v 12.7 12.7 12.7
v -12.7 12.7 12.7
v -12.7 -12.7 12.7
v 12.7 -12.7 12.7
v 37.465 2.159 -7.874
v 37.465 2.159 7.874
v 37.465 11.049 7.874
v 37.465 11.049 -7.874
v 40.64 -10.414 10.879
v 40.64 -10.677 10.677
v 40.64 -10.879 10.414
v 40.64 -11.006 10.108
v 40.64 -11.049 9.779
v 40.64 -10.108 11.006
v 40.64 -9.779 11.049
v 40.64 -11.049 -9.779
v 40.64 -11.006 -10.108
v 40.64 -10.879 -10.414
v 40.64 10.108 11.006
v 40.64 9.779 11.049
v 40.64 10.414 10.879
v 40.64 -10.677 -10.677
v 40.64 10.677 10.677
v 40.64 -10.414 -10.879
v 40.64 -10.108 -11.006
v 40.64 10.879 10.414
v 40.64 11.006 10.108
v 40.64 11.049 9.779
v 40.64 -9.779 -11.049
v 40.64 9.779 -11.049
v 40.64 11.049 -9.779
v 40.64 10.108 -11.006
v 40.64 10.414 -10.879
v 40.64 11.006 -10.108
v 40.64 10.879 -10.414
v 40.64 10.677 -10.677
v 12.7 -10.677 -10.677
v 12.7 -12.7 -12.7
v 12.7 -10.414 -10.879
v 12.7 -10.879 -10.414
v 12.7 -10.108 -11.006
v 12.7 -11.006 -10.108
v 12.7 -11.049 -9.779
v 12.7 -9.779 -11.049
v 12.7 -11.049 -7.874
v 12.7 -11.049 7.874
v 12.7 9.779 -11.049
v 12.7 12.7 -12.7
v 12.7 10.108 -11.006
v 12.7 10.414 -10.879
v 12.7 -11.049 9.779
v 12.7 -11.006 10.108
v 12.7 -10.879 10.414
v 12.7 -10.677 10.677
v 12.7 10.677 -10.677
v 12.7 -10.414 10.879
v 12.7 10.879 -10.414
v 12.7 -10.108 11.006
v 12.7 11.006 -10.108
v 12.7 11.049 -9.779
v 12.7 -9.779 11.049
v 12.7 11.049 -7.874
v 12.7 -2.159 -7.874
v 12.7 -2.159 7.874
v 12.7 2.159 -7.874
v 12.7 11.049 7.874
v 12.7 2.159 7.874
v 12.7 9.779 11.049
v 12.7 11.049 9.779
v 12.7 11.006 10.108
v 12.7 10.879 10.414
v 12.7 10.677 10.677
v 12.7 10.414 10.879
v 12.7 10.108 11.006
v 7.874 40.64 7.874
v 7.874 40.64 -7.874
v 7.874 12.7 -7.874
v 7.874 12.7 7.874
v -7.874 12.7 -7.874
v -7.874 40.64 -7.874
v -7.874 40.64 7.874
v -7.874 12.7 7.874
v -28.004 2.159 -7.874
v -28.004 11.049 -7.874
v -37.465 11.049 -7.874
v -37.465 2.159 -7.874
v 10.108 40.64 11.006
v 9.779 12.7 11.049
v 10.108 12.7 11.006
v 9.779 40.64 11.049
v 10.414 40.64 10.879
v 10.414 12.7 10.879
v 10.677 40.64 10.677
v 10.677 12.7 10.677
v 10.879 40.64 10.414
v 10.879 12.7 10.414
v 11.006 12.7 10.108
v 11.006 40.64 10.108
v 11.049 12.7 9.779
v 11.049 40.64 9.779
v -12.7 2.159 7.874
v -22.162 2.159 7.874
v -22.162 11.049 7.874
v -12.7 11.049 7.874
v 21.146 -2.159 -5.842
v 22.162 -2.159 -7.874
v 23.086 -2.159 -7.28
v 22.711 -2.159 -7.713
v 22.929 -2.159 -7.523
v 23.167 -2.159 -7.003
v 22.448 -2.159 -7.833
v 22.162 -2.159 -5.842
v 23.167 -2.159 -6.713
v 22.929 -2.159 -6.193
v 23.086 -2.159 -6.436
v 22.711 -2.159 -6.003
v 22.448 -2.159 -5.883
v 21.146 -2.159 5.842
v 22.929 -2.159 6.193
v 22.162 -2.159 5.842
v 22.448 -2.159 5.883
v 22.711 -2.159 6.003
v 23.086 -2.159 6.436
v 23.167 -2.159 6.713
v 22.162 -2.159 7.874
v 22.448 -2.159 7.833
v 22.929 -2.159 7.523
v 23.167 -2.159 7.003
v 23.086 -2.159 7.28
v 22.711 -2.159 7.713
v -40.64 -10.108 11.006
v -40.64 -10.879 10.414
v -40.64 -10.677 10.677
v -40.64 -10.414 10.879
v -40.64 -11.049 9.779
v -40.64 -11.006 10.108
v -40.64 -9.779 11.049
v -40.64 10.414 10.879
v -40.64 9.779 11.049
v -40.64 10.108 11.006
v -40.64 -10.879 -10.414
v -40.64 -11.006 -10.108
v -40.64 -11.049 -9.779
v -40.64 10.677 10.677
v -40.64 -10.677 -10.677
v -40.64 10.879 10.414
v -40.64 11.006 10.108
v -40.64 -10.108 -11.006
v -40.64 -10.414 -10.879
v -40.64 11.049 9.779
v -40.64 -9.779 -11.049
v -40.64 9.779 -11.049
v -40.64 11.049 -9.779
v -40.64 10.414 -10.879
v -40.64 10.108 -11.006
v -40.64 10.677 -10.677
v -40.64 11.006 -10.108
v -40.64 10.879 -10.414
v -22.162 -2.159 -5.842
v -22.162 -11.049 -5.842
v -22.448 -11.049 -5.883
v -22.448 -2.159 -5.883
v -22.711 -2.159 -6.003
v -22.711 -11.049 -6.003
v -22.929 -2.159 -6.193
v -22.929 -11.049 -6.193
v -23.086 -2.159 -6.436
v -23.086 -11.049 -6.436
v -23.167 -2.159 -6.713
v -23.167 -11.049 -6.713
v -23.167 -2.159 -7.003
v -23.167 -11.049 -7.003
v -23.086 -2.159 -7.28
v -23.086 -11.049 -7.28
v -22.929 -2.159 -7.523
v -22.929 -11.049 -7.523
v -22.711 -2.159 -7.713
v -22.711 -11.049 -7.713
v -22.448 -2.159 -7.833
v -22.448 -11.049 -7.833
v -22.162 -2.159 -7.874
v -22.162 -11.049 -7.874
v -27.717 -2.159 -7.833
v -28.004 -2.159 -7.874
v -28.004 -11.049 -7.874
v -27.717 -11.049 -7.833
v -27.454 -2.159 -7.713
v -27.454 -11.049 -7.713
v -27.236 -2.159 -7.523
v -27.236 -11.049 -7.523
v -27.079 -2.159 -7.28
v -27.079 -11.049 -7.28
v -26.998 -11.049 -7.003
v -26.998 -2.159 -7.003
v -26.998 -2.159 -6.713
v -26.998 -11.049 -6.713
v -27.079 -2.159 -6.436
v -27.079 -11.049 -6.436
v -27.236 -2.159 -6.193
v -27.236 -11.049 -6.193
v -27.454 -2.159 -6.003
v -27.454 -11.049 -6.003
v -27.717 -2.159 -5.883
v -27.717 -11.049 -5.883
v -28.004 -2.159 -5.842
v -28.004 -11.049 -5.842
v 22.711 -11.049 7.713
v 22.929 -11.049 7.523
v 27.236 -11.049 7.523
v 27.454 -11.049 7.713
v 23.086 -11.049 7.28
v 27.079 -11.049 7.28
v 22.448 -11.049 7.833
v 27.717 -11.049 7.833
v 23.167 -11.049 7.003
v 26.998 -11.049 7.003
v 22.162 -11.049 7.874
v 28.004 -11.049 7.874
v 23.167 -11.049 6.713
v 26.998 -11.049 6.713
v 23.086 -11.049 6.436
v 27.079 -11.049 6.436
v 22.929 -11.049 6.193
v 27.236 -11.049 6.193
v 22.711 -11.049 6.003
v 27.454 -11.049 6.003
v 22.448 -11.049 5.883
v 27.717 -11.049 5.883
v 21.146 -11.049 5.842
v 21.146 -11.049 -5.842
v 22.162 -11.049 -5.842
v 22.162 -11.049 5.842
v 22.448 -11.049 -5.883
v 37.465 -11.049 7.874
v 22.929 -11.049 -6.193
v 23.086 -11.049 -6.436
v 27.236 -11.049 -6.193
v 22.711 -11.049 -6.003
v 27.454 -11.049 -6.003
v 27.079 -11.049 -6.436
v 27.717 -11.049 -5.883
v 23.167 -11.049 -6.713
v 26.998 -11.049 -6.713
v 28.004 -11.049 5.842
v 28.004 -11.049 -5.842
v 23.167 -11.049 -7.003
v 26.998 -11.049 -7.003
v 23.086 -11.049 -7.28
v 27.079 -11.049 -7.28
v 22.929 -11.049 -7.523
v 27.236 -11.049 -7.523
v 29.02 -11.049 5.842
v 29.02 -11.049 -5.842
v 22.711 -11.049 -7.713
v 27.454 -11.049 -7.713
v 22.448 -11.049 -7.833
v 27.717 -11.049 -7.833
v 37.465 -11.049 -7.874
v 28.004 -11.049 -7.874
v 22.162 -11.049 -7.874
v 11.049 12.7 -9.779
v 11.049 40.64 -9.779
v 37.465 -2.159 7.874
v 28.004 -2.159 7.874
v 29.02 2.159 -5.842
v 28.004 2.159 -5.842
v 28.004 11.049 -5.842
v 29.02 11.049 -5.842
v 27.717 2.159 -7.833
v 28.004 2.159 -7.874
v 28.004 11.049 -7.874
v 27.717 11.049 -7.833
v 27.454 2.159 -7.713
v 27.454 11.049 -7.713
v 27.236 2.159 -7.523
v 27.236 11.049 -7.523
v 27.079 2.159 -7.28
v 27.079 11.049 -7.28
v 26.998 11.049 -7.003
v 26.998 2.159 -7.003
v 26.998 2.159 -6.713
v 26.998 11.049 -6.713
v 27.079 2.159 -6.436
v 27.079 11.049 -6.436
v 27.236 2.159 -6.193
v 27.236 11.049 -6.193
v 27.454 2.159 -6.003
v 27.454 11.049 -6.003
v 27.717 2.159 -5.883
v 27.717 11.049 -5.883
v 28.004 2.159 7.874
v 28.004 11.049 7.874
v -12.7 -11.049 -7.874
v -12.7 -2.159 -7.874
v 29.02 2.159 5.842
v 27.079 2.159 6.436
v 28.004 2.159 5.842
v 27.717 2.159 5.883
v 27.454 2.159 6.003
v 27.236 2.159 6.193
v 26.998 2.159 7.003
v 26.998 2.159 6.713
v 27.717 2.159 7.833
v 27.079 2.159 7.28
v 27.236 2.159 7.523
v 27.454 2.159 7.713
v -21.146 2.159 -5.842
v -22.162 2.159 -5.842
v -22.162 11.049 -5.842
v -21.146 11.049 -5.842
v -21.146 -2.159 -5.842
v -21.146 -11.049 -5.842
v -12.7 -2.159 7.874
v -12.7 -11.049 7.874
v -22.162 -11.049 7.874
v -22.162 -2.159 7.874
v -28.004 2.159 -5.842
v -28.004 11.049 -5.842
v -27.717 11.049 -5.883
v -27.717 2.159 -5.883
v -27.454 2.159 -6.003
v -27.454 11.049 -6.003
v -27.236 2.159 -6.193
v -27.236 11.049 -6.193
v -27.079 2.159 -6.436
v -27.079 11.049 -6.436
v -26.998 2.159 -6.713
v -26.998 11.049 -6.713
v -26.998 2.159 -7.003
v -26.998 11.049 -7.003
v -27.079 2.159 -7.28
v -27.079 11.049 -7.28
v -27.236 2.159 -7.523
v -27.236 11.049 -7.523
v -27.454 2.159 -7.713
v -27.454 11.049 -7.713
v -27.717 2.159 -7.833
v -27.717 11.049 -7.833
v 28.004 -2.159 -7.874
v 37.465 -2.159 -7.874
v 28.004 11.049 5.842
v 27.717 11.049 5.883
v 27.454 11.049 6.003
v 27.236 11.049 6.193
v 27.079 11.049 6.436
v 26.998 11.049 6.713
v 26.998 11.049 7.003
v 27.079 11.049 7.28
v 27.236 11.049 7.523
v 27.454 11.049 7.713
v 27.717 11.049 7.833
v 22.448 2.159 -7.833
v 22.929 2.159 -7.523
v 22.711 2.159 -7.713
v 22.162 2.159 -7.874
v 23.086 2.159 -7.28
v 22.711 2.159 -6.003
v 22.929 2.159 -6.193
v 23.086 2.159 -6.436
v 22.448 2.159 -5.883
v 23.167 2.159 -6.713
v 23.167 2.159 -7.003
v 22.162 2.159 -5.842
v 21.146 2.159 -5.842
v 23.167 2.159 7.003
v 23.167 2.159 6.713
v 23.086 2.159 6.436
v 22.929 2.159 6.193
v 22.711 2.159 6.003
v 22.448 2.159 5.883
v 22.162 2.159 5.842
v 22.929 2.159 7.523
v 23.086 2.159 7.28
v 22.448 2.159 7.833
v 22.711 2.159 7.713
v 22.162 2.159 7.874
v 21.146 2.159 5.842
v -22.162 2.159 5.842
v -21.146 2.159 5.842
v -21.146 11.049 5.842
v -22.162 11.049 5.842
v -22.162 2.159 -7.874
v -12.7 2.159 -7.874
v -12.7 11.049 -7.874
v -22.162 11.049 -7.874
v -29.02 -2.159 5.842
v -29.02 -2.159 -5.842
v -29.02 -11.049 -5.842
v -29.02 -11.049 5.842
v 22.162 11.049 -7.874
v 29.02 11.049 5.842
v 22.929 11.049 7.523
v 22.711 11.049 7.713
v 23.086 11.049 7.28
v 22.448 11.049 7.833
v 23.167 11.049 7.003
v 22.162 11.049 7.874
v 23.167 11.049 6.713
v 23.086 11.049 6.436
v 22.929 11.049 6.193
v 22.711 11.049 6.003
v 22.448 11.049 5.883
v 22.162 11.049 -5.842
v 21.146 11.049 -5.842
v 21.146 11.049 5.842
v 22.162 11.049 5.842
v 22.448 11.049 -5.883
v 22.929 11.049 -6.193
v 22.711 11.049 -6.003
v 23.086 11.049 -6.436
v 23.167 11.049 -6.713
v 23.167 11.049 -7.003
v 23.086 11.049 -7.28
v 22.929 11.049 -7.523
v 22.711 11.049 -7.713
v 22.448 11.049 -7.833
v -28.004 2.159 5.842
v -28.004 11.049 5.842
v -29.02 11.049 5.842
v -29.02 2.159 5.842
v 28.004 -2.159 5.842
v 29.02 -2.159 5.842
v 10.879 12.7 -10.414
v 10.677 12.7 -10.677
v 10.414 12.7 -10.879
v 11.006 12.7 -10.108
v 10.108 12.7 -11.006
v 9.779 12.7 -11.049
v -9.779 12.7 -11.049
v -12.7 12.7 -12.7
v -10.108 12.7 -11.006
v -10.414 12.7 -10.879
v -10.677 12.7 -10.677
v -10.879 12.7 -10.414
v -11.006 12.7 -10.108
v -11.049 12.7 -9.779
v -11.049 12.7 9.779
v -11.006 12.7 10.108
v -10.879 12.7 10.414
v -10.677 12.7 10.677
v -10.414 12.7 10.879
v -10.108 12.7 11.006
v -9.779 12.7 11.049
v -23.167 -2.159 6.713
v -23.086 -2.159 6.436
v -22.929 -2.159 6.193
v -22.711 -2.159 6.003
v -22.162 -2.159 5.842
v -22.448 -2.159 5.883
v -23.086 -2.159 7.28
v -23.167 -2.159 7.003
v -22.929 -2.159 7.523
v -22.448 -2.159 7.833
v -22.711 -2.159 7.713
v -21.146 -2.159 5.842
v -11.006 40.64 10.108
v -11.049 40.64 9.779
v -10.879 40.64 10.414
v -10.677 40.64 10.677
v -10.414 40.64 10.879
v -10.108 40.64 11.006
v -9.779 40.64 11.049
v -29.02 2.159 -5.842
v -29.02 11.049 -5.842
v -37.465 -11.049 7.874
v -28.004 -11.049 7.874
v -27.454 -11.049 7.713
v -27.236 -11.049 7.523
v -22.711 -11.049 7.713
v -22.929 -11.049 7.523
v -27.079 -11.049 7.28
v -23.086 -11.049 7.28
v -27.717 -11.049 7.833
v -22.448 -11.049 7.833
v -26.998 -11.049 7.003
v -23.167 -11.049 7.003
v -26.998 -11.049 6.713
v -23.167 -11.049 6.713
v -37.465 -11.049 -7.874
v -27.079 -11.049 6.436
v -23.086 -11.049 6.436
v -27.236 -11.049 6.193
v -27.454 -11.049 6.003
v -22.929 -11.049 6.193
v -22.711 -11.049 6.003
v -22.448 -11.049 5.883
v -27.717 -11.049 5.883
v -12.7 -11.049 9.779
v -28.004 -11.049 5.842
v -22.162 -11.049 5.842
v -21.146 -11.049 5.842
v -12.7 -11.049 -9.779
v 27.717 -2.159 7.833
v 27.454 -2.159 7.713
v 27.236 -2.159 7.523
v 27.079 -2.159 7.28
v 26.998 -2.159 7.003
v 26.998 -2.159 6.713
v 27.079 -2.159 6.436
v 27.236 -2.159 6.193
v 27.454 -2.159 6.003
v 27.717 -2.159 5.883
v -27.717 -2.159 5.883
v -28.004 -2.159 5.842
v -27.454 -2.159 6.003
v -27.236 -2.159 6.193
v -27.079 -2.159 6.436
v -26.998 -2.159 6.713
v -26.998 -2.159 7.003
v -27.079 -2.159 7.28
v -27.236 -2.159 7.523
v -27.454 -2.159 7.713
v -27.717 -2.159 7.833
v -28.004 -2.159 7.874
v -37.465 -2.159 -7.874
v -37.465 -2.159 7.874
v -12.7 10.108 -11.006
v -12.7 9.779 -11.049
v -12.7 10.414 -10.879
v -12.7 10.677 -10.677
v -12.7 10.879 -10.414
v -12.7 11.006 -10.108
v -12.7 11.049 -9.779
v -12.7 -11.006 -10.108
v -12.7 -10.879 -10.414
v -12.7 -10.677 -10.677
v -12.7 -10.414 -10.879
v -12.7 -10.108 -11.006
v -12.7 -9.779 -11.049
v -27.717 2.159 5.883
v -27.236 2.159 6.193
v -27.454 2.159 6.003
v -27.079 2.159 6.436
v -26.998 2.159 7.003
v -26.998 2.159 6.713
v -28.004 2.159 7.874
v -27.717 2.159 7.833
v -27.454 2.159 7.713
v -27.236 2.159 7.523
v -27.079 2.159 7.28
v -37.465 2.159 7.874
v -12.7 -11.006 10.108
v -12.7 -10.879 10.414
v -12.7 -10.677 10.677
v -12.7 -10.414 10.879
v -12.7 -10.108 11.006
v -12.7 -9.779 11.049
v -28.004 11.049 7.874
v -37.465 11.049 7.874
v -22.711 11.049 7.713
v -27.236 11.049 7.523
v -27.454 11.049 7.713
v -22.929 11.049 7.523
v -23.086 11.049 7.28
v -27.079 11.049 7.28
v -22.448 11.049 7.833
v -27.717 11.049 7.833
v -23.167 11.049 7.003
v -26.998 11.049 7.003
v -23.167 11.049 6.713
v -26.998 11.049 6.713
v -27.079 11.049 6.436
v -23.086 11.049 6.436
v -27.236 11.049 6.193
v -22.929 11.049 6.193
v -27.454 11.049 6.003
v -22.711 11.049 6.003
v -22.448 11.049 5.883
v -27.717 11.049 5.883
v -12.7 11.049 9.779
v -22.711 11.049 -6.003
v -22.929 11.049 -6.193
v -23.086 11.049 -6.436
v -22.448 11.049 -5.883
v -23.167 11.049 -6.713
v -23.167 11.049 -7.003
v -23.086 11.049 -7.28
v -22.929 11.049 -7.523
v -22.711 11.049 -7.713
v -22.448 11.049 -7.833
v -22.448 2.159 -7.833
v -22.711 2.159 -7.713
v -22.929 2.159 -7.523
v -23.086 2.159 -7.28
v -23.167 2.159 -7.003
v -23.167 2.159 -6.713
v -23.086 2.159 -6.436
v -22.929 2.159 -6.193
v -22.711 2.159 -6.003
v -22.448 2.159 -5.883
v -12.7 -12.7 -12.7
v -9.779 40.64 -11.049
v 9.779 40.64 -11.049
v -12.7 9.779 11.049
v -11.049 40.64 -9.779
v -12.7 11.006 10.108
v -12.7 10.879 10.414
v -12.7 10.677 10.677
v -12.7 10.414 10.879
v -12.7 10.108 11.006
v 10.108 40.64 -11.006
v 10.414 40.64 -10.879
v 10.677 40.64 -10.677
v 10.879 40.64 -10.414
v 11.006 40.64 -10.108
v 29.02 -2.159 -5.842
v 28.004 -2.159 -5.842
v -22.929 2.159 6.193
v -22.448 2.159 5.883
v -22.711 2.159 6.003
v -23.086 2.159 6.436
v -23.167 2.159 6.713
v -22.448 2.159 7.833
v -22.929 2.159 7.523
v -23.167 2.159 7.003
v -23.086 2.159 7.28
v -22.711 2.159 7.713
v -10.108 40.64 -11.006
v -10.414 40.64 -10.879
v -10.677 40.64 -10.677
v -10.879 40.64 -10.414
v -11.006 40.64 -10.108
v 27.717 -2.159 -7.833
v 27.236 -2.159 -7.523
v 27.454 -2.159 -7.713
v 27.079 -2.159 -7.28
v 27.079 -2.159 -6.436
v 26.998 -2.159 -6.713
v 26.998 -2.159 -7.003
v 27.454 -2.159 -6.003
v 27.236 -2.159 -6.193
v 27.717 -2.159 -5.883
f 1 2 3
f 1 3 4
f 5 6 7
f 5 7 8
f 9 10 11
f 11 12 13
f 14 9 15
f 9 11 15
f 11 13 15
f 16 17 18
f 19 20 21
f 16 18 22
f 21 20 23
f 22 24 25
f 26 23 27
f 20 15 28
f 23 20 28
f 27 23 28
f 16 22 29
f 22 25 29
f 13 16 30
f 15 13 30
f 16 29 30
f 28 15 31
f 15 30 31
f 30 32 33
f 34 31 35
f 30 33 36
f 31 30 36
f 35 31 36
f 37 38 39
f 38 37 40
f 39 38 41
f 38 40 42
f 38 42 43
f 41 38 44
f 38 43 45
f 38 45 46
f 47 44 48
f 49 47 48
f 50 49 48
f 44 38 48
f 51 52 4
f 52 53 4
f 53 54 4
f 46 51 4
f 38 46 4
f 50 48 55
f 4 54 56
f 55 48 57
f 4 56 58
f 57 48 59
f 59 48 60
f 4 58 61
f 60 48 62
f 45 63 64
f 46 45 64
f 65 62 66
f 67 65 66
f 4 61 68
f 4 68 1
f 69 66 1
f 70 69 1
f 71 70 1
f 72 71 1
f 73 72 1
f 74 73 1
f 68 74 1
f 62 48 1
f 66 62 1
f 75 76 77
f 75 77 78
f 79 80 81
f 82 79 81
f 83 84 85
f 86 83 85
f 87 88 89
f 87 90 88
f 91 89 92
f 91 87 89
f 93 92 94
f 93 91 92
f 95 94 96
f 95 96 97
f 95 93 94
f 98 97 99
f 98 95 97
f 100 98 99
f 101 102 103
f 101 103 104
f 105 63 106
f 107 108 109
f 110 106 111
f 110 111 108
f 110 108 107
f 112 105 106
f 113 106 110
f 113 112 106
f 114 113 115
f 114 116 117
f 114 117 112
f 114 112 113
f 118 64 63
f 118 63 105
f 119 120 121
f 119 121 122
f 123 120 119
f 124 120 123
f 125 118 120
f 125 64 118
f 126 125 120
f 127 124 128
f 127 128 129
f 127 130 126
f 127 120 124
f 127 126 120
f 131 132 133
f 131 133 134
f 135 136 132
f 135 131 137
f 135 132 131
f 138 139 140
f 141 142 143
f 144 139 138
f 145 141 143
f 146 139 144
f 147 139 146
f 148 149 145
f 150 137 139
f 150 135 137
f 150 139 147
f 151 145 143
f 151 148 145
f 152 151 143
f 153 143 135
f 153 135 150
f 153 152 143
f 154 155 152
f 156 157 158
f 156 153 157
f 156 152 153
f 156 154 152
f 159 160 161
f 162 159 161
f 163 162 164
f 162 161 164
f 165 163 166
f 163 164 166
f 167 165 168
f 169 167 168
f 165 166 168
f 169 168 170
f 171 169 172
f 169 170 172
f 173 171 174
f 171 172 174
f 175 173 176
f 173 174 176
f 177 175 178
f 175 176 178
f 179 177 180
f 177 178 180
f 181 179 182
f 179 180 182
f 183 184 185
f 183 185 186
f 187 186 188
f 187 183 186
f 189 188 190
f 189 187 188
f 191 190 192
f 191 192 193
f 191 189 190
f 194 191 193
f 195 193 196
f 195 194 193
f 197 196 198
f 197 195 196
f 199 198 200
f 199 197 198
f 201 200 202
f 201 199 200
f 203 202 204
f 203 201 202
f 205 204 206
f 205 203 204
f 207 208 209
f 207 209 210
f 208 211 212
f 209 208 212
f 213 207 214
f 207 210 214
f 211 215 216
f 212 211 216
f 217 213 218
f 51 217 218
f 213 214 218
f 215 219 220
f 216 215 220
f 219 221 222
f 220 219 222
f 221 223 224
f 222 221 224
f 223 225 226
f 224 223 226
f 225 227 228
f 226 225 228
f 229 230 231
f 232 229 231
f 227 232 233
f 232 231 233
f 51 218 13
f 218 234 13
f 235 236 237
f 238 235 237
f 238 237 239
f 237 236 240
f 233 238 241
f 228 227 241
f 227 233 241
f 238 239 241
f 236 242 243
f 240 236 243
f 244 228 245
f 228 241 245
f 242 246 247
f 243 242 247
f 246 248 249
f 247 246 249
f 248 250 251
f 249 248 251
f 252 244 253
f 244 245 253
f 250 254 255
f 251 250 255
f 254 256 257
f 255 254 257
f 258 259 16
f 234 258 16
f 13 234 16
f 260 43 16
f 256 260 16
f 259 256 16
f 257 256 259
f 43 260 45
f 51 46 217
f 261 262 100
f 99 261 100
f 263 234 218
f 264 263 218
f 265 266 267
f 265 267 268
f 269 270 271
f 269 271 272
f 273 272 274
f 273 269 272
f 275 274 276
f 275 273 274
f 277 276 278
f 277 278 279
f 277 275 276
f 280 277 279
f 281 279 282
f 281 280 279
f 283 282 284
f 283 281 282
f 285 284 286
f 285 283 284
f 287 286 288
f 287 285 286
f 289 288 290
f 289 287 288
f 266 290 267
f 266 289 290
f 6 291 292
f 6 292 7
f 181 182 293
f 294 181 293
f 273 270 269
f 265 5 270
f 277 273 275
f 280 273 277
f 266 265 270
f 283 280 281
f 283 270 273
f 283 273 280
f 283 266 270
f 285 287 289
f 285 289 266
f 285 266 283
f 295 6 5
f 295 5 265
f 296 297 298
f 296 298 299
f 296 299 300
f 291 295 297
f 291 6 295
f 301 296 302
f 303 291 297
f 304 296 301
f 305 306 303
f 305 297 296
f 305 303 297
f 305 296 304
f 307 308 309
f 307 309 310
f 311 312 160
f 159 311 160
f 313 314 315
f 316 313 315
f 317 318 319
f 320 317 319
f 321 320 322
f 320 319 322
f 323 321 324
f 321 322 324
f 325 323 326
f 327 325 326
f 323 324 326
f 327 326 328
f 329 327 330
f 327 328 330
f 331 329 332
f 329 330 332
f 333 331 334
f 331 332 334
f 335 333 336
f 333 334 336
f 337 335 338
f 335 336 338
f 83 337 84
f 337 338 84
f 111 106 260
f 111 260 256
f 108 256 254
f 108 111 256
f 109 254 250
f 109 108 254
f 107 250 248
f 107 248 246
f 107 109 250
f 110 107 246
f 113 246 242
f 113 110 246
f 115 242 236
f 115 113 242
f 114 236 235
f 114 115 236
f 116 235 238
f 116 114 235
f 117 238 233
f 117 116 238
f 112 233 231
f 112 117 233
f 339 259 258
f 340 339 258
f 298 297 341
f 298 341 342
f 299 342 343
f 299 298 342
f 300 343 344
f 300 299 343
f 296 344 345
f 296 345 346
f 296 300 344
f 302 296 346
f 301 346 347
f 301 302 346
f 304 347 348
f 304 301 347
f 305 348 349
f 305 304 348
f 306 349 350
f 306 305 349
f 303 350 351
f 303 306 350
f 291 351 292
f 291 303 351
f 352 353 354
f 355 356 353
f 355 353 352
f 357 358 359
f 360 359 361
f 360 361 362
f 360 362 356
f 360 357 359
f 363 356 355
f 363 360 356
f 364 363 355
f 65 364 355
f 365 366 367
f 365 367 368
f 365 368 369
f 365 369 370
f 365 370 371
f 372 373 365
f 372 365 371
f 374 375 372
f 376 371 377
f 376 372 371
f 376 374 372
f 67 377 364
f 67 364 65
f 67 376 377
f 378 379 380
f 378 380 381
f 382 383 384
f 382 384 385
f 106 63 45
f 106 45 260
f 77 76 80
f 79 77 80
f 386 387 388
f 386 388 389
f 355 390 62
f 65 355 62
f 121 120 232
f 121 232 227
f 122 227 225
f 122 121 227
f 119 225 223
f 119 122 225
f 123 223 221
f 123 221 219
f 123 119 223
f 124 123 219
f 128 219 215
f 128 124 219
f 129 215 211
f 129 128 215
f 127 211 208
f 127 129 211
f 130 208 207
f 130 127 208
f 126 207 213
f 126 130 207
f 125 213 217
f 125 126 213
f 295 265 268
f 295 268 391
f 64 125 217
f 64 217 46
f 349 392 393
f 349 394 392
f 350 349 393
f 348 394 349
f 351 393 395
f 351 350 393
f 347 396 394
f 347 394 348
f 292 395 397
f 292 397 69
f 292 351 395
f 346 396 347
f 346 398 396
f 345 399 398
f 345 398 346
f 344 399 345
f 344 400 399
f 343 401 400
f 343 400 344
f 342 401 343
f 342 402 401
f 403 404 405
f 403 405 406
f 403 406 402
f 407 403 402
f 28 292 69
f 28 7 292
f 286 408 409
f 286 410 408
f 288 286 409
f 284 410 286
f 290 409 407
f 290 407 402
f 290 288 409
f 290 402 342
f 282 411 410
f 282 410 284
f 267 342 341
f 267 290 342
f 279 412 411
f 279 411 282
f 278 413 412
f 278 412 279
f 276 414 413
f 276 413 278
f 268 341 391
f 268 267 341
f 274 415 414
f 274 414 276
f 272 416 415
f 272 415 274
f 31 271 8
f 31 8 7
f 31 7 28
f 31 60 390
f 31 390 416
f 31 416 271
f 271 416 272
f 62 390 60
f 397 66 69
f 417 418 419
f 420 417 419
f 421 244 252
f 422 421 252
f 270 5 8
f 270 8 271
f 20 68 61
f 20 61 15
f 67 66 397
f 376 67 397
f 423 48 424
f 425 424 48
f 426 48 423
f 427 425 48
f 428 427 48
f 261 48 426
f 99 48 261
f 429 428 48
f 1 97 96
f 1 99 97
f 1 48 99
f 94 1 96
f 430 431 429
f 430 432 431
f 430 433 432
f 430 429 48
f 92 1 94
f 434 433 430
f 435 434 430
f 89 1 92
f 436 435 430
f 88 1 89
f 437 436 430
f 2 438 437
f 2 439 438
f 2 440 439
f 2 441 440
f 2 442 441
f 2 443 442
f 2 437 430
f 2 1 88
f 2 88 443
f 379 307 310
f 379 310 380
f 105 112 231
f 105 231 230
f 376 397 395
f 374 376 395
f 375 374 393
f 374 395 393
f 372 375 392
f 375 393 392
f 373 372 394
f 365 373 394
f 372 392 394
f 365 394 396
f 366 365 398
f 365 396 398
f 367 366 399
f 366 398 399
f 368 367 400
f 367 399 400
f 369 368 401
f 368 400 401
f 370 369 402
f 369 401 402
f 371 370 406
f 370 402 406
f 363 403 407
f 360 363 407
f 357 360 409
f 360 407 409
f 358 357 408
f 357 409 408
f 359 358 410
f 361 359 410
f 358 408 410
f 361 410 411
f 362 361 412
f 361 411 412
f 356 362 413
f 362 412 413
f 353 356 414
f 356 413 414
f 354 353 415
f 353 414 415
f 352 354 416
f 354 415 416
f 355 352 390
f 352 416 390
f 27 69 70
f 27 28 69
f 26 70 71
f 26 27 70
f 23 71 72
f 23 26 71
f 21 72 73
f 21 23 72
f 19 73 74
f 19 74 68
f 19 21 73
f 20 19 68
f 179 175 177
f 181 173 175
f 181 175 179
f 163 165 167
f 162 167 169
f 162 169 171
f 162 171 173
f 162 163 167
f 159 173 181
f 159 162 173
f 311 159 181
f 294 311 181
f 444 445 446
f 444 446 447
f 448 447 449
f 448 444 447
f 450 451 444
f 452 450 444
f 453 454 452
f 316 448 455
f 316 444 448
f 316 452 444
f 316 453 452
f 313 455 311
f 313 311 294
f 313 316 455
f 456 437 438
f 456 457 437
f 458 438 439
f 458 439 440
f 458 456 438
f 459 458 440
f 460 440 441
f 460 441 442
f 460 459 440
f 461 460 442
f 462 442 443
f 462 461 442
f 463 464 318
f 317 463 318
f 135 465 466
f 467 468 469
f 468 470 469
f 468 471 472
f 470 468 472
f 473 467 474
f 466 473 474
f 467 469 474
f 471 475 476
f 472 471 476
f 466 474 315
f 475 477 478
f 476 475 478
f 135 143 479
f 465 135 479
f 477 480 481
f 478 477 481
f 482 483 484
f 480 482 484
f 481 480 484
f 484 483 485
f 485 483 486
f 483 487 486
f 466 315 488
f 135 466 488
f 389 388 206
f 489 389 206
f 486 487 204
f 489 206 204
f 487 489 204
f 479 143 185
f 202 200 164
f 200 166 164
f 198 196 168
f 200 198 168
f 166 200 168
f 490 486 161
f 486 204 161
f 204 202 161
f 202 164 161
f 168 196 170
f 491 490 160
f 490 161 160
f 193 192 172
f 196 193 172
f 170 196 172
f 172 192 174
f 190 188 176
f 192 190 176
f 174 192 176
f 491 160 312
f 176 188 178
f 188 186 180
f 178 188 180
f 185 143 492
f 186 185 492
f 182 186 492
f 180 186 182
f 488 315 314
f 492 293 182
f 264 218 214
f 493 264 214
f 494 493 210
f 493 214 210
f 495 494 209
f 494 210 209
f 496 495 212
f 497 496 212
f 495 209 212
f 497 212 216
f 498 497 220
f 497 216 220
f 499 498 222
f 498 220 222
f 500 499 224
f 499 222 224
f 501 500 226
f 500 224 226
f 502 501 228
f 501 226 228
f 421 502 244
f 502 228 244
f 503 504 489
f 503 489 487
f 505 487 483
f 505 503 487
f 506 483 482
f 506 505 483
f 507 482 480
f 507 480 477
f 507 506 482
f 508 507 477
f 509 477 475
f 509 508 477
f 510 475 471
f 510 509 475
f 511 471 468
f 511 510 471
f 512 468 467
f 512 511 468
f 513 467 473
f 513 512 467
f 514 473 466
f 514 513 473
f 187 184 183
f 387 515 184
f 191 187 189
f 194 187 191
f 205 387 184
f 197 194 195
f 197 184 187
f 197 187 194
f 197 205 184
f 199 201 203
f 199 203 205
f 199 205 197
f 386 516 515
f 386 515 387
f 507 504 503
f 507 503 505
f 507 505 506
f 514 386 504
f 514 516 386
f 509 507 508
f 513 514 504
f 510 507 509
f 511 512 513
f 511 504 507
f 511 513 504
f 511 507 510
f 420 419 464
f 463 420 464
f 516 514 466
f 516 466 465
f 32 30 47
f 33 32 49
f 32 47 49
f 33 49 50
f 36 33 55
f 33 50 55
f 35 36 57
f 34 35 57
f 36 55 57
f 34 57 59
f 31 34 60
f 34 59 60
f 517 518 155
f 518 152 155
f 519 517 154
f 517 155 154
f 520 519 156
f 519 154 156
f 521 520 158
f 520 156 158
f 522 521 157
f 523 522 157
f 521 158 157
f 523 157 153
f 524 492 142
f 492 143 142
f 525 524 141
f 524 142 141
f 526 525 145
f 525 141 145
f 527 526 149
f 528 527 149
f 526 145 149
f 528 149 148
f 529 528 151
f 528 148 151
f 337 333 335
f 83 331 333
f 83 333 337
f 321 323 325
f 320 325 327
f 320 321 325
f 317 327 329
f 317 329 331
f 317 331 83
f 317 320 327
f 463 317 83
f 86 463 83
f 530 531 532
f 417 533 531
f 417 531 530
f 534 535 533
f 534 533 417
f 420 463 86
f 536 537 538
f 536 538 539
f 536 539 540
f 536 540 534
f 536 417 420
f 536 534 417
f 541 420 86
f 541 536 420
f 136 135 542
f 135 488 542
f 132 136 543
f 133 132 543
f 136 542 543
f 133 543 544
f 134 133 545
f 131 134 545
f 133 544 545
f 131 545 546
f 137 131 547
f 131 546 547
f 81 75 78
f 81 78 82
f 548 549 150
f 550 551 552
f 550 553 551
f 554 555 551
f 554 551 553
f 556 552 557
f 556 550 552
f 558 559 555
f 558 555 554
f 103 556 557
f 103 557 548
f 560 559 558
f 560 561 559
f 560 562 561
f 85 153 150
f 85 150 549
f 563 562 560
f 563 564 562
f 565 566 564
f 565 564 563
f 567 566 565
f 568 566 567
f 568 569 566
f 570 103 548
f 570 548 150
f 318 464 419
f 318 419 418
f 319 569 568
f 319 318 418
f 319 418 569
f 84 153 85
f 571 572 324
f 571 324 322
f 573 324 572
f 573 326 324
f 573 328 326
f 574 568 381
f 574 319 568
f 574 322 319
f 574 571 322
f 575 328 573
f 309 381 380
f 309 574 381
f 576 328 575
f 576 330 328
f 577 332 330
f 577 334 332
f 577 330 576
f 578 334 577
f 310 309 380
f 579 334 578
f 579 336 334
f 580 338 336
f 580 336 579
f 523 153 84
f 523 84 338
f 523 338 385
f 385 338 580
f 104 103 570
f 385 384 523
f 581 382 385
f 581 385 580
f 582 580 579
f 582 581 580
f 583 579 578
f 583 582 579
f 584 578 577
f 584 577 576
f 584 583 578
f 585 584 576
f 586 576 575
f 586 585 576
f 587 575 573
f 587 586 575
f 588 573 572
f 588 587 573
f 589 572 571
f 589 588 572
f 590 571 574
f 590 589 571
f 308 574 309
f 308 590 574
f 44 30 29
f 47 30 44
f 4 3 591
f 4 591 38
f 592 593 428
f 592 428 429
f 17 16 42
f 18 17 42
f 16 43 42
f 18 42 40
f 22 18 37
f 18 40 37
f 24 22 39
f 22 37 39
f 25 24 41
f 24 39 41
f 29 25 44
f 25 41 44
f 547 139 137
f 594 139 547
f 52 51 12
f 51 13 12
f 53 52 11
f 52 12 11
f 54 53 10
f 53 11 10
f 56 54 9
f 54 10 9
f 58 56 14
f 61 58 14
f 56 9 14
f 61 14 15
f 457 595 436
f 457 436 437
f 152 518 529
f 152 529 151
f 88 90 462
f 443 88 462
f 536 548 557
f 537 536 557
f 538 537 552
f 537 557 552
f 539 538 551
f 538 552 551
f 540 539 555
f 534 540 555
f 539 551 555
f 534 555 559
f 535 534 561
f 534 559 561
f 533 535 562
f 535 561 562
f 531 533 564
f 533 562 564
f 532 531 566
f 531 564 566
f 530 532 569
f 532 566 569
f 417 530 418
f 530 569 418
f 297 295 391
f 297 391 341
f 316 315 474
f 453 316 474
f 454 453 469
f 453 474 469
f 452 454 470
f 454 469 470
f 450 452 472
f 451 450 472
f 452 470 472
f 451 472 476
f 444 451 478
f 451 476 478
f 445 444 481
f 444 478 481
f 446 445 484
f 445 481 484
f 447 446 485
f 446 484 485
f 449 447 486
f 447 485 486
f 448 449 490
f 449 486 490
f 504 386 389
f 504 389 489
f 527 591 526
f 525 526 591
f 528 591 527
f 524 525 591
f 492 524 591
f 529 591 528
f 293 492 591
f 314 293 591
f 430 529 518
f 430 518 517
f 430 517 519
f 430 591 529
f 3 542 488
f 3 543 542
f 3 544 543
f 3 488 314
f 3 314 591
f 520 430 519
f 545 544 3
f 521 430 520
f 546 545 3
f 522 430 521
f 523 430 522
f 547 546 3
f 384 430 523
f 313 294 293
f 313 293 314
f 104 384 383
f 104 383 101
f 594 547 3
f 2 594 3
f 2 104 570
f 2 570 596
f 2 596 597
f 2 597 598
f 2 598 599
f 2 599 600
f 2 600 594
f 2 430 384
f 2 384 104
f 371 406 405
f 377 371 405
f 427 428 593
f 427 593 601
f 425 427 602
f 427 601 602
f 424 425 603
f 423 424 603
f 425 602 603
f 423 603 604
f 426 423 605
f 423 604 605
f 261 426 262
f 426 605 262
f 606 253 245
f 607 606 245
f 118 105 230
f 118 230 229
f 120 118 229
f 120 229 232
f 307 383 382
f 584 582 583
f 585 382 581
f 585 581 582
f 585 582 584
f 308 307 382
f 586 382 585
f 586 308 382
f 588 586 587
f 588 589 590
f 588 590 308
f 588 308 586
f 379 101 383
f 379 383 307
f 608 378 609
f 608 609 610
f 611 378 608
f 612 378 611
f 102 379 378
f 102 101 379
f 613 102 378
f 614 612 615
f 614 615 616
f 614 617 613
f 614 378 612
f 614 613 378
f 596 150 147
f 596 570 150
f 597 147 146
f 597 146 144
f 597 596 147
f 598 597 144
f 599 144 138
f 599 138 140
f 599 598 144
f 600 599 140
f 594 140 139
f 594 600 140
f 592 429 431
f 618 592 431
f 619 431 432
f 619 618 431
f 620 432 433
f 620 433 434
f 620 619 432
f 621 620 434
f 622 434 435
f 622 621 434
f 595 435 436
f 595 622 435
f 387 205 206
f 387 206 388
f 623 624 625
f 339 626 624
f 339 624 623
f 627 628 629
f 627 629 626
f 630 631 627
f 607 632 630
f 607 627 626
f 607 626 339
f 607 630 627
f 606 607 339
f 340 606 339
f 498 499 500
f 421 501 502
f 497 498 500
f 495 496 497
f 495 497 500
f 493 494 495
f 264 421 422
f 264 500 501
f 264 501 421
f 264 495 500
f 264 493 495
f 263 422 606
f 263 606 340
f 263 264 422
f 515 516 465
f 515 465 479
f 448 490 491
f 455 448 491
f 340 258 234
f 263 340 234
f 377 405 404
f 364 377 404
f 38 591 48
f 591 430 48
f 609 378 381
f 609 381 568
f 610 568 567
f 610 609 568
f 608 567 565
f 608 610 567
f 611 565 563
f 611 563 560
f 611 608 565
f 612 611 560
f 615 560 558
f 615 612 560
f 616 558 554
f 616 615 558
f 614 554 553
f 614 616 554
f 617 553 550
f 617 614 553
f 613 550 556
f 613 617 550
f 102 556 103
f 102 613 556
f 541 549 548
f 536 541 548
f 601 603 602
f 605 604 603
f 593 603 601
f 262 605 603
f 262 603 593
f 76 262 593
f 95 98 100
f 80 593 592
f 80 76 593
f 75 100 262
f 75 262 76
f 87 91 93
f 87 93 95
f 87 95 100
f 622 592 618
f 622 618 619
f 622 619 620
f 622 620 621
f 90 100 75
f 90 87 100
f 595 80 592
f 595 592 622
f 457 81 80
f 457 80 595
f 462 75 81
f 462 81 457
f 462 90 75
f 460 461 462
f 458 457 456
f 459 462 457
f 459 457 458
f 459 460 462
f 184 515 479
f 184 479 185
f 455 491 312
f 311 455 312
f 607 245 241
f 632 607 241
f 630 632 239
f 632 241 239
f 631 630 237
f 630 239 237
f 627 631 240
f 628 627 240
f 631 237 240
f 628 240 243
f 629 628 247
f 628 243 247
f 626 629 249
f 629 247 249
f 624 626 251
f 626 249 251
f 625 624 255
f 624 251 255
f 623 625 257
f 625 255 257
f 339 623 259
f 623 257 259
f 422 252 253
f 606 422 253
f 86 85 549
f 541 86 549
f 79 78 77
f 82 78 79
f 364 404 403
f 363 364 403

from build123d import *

# Parameters (mm, degrees)
CUT_EXTRUDE1_START       = -25.4
CUT_EXTRUDE1_OUTLINE_W   = 81.28
CUT_EXTRUDE1_OUTLINE_H   = 22.098
CUT_EXTRUDE1_DEPTH       = 23.749
CUT_EXTRUDE1_START_2     = -1.651
CUT_EXTRUDE1_2_OUTLINE_W = 53.34
CUT_EXTRUDE1_2_OUTLINE_H = 22.098
CUT_EXTRUDE1_2_DEPTH     = 1.651
SKETCH2_W                = 27.94
SKETCH2_H                = 22.098
CUT_EXTRUDE2_DEPTH       = 1.651
SKETCH3_W                = 27.94
SKETCH3_H                = 22.098
CUT_EXTRUDE3_DEPTH       = 1.651
SKETCH4_W                = 27.94
SKETCH4_H                = 22.098
CUT_EXTRUDE4_DEPTH       = 1.651
SKETCH5_W                = 25.4
SKETCH5_H                = 25.4
BOSS_EXTRUDE1_DEPTH      = 1.651
SKETCH6_W                = 25.4
SKETCH6_H                = 25.4
BOSS_EXTRUDE2_DEPTH      = 1.651
CUT_EXTRUDE5_DEPTH       = 8.89
CUT_EXTRUDE6_DEPTH       = 8.89
CUT_EXTRUDE7_START       = -8.89
CUT_EXTRUDE7_DEPTH       = 8.89
CUT_EXTRUDE8_START       = -8.89
CUT_EXTRUDE8_DEPTH       = 8.89
CUT_EXTRUDE9_DEPTH       = 8.89
CUT_EXTRUDE10_START      = -8.89
CUT_EXTRUDE10_DEPTH      = 8.89
CUT_EXTRUDE11_DEPTH      = 8.89
CUT_EXTRUDE12_START      = -8.89
CUT_EXTRUDE12_DEPTH      = 8.89
SKETCH15_W               = 22.098
SKETCH15_H               = 22.098
BOSS_EXTRUDE3_DEPTH      = 27.94
SKETCH16_W               = 15.748
SKETCH16_H               = 15.748
CUT_EXTRUDE13_DEPTH      = 27.94
FILLET1_R                = 1.27


with BuildPart() as part:
    # Cut-Extrude1: read off the stored shape, not the designer's step
    # Cut-Extrude1 outline → Cut-Extrude1 (new body)
    with BuildSketch(Plane.XY.offset(12.7).offset(CUT_EXTRUDE1_START)):
        Rectangle(CUT_EXTRUDE1_OUTLINE_W, CUT_EXTRUDE1_OUTLINE_H)
    extrude(amount=CUT_EXTRUDE1_DEPTH)

    # Cut-Extrude1 2 outline → Cut-Extrude1 2 (add)
    with BuildSketch(Plane.XY.offset(12.7).offset(CUT_EXTRUDE1_START_2)):
        with Locations((13.97, 0)):
            Rectangle(CUT_EXTRUDE1_2_OUTLINE_W, CUT_EXTRUDE1_2_OUTLINE_H)
    extrude(amount=CUT_EXTRUDE1_2_DEPTH)

    # Sketch2 → Cut-Extrude2 (cut)
    with BuildSketch(Plane(origin=(0, 0, -12.7), x_dir=(-1, 0, 0), z_dir=(0, 0, -1))):
        with Locations((26.67, 0)):
            Rectangle(SKETCH2_W, SKETCH2_H)
    extrude(amount=-CUT_EXTRUDE2_DEPTH, mode=Mode.SUBTRACT)

    # Sketch3 → Cut-Extrude3 (cut)
    with BuildSketch(Plane(origin=(0, 0, -12.7), x_dir=(-1, 0, 0), z_dir=(0, 0, -1))):
        with Locations((-26.67, 0)):
            Rectangle(SKETCH3_W, SKETCH3_H)
    extrude(amount=-CUT_EXTRUDE3_DEPTH, mode=Mode.SUBTRACT)

    # Sketch4 → Cut-Extrude4 (cut)
    with BuildSketch(Plane.XY.offset(12.7)):
        with Locations((26.67, 0)):
            Rectangle(SKETCH4_W, SKETCH4_H)
    extrude(amount=-CUT_EXTRUDE4_DEPTH, mode=Mode.SUBTRACT)

    # Sketch5 → Boss-Extrude1 (add)
    with BuildSketch(Plane(origin=(0, 11.049, 0), x_dir=(-1, 0, 0), z_dir=(0, 1, 0))):
        Rectangle(SKETCH5_W, SKETCH5_H)
    extrude(amount=BOSS_EXTRUDE1_DEPTH)

    # Sketch6 → Boss-Extrude2 (add)
    with BuildSketch(Plane.XZ.offset(11.049)):
        Rectangle(SKETCH6_W, SKETCH6_H)
    extrude(amount=BOSS_EXTRUDE2_DEPTH)

    # Sketch7 → Cut-Extrude5 (cut)
    with BuildSketch(Plane(origin=(0, 11.049, 0), x_dir=(-1, 0, 0), z_dir=(0, 1, 0))):
        with BuildLine():
            Line((-12.7, -7.874), (-12.7, 7.874))
            Line((-12.7, 7.874), (-22.1615, 7.874))
            ThreePointArc((-22.1615, 7.874), (-23.1775, 6.858), (-22.1615, 5.842))
            Line((-22.1615, 5.842), (-21.1455, 5.842))
            Line((-21.1455, 5.842), (-21.1455, -5.842))
            Line((-21.1455, -5.842), (-22.1615, -5.842))
            ThreePointArc((-22.1615, -5.842), (-23.1775, -6.858), (-22.1615, -7.874))
            Line((-22.1615, -7.874), (-12.7, -7.874))
        make_face()
    extrude(amount=-CUT_EXTRUDE5_DEPTH, mode=Mode.SUBTRACT)

    # Sketch8 → Cut-Extrude6 (cut)
    with BuildSketch(Plane.XZ.offset(11.049)):
        with BuildLine():
            Line((-22.1615, 5.842), (-21.1455, 5.842))
            Line((-21.1455, 5.842), (-21.1455, -5.842))
            Line((-21.1455, -5.842), (-22.1615, -5.842))
            ThreePointArc((-22.1615, -5.842), (-23.1775, -6.858), (-22.1615, -7.874))
            Line((-22.1615, -7.874), (-12.7, -7.874))
            Line((-12.7, -7.874), (-12.7, 7.874))
            Line((-12.7, 7.874), (-22.1615, 7.874))
            ThreePointArc((-22.1615, 7.874), (-23.1775, 6.858), (-22.1615, 5.842))
        make_face()
    extrude(amount=-CUT_EXTRUDE6_DEPTH, mode=Mode.SUBTRACT)

    # Sketch9 → Cut-Extrude7 (cut)
    with BuildSketch(Plane.XZ.offset(11.049).offset(CUT_EXTRUDE7_START)):
        with BuildLine():
            Line((12.7, 7.874), (12.7, -7.874))
            Line((12.7, -7.874), (22.1615, -7.874))
            ThreePointArc((22.1615, -7.874), (23.1775, -6.858), (22.1615, -5.842))
            Line((22.1615, -5.842), (21.1455, -5.842))
            Line((21.1455, -5.842), (21.1455, 5.842))
            Line((21.1455, 5.842), (22.1615, 5.842))
            ThreePointArc((22.1615, 5.842), (23.1775, 6.858), (22.1615, 7.874))
            Line((22.1615, 7.874), (12.7, 7.874))
        make_face()
    extrude(amount=CUT_EXTRUDE7_DEPTH, mode=Mode.SUBTRACT)

    # Sketch10 → Cut-Extrude8 (cut)
    with BuildSketch(Plane(origin=(0, 11.049, 0), x_dir=(-1, 0, 0), z_dir=(0, 1, 0)).offset(CUT_EXTRUDE8_START)):
        with BuildLine():
            Line((21.1455, 5.842), (22.1615, 5.842))
            ThreePointArc((22.1615, 5.842), (23.1775, 6.858), (22.1615, 7.874))
            Line((22.1615, 7.874), (12.7, 7.874))
            Line((12.7, 7.874), (12.7, -7.874))
            Line((12.7, -7.874), (22.1615, -7.874))
            ThreePointArc((22.1615, -7.874), (23.1775, -6.858), (22.1615, -5.842))
            Line((22.1615, -5.842), (21.1455, -5.842))
            Line((21.1455, -5.842), (21.1455, 5.842))
        make_face()
    extrude(amount=CUT_EXTRUDE8_DEPTH, mode=Mode.SUBTRACT)

    # Sketch11 → Cut-Extrude9 (cut)
    with BuildSketch(Plane.XZ.offset(11.049)):
        with BuildLine():
            Line((28.0035, 5.842), (29.0195, 5.842))
            Line((29.0195, 5.842), (29.0195, -5.842))
            Line((29.0195, -5.842), (28.0035, -5.842))
            ThreePointArc((28.0035, -5.842), (26.9875, -6.858), (28.0035, -7.874))
            Line((28.0035, -7.874), (37.465, -7.874))
            Line((37.465, -7.874), (37.465, 7.874))
            Line((37.465, 7.874), (28.0035, 7.874))
            ThreePointArc((28.0035, 7.874), (26.9875, 6.858), (28.0035, 5.842))
        make_face()
    extrude(amount=-CUT_EXTRUDE9_DEPTH, mode=Mode.SUBTRACT)

    # Sketch12 → Cut-Extrude10 (cut)
    with BuildSketch(Plane(origin=(0, 11.049, 0), x_dir=(-1, 0, 0), z_dir=(0, 1, 0)).offset(CUT_EXTRUDE10_START)):
        with BuildLine():
            Line((-29.0195, -5.842), (-29.0195, 5.842))
            Line((-29.0195, 5.842), (-28.0035, 5.842))
            ThreePointArc((-28.0035, 5.842), (-26.9875, 6.858), (-28.0035, 7.874))
            Line((-28.0035, 7.874), (-37.465, 7.874))
            Line((-37.465, 7.874), (-37.465, -7.874))
            Line((-37.465, -7.874), (-28.0035, -7.874))
            ThreePointArc((-28.0035, -7.874), (-26.9875, -6.858), (-28.0035, -5.842))
            Line((-28.0035, -5.842), (-29.0195, -5.842))
        make_face()
    extrude(amount=CUT_EXTRUDE10_DEPTH, mode=Mode.SUBTRACT)

    # Sketch13 → Cut-Extrude11 (cut)
    with BuildSketch(Plane(origin=(0, 11.049, 0), x_dir=(-1, 0, 0), z_dir=(0, 1, 0))):
        with BuildLine():
            Line((28.0035, -7.874), (37.465, -7.874))
            Line((37.465, -7.874), (37.465, 7.874))
            Line((37.465, 7.874), (28.0035, 7.874))
            ThreePointArc((28.0035, 7.874), (26.9875, 6.858), (28.0035, 5.842))
            Line((28.0035, 5.842), (29.0195, 5.842))
            Line((29.0195, 5.842), (29.0195, -5.842))
            Line((29.0195, -5.842), (28.0035, -5.842))
            ThreePointArc((28.0035, -5.842), (26.9875, -6.858), (28.0035, -7.874))
        make_face()
    extrude(amount=-CUT_EXTRUDE11_DEPTH, mode=Mode.SUBTRACT)

    # Sketch14 → Cut-Extrude12 (cut)
    with BuildSketch(Plane.XZ.offset(11.049).offset(CUT_EXTRUDE12_START)):
        with BuildLine():
            Line((-37.465, 7.874), (-37.465, -7.874))
            Line((-37.465, -7.874), (-28.0035, -7.874))
            ThreePointArc((-28.0035, -7.874), (-26.9875, -6.858), (-28.0035, -5.842))
            Line((-28.0035, -5.842), (-29.0195, -5.842))
            Line((-29.0195, -5.842), (-29.0195, 5.842))
            Line((-29.0195, 5.842), (-28.0035, 5.842))
            ThreePointArc((-28.0035, 5.842), (-26.9875, 6.858), (-28.0035, 7.874))
            Line((-28.0035, 7.874), (-37.465, 7.874))
        make_face()
    extrude(amount=CUT_EXTRUDE12_DEPTH, mode=Mode.SUBTRACT)

    # Sketch15 → Boss-Extrude3 (add)
    with BuildSketch(Plane(origin=(0, 12.7, 0), x_dir=(-1, 0, 0), z_dir=(0, 1, 0))):
        Rectangle(SKETCH15_W, SKETCH15_H)
    extrude(amount=BOSS_EXTRUDE3_DEPTH)

    # Sketch16 → Cut-Extrude13 (cut)
    with BuildSketch(Plane(origin=(0, 40.64, 0), x_dir=(-1, 0, 0), z_dir=(0, 1, 0))):
        Rectangle(SKETCH16_W, SKETCH16_H)
    extrude(amount=-CUT_EXTRUDE13_DEPTH, mode=Mode.SUBTRACT)

    # Fillet1
    fillet1_edges = [part.edges().sort_by_distance(p)[0] for p in [
        (11.049, 26.67, 11.049),
        (-26.67, 11.049, 11.049),
        (-26.67, -11.049, -11.049),
        (26.67, 11.049, 11.049),
        (11.049, 26.67, -11.049),
        (26.67, 11.049, -11.049),
        (-26.67, -11.049, 11.049),
        (26.67, -11.049, 11.049),
        (-26.67, 11.049, -11.049),
        (-11.049, 26.67, 11.049),
        (26.67, -11.049, -11.049),
        (-11.049, 26.67, -11.049),
    ]]
    fillet(fillet1_edges, radius=FILLET1_R)


solid = part.part
